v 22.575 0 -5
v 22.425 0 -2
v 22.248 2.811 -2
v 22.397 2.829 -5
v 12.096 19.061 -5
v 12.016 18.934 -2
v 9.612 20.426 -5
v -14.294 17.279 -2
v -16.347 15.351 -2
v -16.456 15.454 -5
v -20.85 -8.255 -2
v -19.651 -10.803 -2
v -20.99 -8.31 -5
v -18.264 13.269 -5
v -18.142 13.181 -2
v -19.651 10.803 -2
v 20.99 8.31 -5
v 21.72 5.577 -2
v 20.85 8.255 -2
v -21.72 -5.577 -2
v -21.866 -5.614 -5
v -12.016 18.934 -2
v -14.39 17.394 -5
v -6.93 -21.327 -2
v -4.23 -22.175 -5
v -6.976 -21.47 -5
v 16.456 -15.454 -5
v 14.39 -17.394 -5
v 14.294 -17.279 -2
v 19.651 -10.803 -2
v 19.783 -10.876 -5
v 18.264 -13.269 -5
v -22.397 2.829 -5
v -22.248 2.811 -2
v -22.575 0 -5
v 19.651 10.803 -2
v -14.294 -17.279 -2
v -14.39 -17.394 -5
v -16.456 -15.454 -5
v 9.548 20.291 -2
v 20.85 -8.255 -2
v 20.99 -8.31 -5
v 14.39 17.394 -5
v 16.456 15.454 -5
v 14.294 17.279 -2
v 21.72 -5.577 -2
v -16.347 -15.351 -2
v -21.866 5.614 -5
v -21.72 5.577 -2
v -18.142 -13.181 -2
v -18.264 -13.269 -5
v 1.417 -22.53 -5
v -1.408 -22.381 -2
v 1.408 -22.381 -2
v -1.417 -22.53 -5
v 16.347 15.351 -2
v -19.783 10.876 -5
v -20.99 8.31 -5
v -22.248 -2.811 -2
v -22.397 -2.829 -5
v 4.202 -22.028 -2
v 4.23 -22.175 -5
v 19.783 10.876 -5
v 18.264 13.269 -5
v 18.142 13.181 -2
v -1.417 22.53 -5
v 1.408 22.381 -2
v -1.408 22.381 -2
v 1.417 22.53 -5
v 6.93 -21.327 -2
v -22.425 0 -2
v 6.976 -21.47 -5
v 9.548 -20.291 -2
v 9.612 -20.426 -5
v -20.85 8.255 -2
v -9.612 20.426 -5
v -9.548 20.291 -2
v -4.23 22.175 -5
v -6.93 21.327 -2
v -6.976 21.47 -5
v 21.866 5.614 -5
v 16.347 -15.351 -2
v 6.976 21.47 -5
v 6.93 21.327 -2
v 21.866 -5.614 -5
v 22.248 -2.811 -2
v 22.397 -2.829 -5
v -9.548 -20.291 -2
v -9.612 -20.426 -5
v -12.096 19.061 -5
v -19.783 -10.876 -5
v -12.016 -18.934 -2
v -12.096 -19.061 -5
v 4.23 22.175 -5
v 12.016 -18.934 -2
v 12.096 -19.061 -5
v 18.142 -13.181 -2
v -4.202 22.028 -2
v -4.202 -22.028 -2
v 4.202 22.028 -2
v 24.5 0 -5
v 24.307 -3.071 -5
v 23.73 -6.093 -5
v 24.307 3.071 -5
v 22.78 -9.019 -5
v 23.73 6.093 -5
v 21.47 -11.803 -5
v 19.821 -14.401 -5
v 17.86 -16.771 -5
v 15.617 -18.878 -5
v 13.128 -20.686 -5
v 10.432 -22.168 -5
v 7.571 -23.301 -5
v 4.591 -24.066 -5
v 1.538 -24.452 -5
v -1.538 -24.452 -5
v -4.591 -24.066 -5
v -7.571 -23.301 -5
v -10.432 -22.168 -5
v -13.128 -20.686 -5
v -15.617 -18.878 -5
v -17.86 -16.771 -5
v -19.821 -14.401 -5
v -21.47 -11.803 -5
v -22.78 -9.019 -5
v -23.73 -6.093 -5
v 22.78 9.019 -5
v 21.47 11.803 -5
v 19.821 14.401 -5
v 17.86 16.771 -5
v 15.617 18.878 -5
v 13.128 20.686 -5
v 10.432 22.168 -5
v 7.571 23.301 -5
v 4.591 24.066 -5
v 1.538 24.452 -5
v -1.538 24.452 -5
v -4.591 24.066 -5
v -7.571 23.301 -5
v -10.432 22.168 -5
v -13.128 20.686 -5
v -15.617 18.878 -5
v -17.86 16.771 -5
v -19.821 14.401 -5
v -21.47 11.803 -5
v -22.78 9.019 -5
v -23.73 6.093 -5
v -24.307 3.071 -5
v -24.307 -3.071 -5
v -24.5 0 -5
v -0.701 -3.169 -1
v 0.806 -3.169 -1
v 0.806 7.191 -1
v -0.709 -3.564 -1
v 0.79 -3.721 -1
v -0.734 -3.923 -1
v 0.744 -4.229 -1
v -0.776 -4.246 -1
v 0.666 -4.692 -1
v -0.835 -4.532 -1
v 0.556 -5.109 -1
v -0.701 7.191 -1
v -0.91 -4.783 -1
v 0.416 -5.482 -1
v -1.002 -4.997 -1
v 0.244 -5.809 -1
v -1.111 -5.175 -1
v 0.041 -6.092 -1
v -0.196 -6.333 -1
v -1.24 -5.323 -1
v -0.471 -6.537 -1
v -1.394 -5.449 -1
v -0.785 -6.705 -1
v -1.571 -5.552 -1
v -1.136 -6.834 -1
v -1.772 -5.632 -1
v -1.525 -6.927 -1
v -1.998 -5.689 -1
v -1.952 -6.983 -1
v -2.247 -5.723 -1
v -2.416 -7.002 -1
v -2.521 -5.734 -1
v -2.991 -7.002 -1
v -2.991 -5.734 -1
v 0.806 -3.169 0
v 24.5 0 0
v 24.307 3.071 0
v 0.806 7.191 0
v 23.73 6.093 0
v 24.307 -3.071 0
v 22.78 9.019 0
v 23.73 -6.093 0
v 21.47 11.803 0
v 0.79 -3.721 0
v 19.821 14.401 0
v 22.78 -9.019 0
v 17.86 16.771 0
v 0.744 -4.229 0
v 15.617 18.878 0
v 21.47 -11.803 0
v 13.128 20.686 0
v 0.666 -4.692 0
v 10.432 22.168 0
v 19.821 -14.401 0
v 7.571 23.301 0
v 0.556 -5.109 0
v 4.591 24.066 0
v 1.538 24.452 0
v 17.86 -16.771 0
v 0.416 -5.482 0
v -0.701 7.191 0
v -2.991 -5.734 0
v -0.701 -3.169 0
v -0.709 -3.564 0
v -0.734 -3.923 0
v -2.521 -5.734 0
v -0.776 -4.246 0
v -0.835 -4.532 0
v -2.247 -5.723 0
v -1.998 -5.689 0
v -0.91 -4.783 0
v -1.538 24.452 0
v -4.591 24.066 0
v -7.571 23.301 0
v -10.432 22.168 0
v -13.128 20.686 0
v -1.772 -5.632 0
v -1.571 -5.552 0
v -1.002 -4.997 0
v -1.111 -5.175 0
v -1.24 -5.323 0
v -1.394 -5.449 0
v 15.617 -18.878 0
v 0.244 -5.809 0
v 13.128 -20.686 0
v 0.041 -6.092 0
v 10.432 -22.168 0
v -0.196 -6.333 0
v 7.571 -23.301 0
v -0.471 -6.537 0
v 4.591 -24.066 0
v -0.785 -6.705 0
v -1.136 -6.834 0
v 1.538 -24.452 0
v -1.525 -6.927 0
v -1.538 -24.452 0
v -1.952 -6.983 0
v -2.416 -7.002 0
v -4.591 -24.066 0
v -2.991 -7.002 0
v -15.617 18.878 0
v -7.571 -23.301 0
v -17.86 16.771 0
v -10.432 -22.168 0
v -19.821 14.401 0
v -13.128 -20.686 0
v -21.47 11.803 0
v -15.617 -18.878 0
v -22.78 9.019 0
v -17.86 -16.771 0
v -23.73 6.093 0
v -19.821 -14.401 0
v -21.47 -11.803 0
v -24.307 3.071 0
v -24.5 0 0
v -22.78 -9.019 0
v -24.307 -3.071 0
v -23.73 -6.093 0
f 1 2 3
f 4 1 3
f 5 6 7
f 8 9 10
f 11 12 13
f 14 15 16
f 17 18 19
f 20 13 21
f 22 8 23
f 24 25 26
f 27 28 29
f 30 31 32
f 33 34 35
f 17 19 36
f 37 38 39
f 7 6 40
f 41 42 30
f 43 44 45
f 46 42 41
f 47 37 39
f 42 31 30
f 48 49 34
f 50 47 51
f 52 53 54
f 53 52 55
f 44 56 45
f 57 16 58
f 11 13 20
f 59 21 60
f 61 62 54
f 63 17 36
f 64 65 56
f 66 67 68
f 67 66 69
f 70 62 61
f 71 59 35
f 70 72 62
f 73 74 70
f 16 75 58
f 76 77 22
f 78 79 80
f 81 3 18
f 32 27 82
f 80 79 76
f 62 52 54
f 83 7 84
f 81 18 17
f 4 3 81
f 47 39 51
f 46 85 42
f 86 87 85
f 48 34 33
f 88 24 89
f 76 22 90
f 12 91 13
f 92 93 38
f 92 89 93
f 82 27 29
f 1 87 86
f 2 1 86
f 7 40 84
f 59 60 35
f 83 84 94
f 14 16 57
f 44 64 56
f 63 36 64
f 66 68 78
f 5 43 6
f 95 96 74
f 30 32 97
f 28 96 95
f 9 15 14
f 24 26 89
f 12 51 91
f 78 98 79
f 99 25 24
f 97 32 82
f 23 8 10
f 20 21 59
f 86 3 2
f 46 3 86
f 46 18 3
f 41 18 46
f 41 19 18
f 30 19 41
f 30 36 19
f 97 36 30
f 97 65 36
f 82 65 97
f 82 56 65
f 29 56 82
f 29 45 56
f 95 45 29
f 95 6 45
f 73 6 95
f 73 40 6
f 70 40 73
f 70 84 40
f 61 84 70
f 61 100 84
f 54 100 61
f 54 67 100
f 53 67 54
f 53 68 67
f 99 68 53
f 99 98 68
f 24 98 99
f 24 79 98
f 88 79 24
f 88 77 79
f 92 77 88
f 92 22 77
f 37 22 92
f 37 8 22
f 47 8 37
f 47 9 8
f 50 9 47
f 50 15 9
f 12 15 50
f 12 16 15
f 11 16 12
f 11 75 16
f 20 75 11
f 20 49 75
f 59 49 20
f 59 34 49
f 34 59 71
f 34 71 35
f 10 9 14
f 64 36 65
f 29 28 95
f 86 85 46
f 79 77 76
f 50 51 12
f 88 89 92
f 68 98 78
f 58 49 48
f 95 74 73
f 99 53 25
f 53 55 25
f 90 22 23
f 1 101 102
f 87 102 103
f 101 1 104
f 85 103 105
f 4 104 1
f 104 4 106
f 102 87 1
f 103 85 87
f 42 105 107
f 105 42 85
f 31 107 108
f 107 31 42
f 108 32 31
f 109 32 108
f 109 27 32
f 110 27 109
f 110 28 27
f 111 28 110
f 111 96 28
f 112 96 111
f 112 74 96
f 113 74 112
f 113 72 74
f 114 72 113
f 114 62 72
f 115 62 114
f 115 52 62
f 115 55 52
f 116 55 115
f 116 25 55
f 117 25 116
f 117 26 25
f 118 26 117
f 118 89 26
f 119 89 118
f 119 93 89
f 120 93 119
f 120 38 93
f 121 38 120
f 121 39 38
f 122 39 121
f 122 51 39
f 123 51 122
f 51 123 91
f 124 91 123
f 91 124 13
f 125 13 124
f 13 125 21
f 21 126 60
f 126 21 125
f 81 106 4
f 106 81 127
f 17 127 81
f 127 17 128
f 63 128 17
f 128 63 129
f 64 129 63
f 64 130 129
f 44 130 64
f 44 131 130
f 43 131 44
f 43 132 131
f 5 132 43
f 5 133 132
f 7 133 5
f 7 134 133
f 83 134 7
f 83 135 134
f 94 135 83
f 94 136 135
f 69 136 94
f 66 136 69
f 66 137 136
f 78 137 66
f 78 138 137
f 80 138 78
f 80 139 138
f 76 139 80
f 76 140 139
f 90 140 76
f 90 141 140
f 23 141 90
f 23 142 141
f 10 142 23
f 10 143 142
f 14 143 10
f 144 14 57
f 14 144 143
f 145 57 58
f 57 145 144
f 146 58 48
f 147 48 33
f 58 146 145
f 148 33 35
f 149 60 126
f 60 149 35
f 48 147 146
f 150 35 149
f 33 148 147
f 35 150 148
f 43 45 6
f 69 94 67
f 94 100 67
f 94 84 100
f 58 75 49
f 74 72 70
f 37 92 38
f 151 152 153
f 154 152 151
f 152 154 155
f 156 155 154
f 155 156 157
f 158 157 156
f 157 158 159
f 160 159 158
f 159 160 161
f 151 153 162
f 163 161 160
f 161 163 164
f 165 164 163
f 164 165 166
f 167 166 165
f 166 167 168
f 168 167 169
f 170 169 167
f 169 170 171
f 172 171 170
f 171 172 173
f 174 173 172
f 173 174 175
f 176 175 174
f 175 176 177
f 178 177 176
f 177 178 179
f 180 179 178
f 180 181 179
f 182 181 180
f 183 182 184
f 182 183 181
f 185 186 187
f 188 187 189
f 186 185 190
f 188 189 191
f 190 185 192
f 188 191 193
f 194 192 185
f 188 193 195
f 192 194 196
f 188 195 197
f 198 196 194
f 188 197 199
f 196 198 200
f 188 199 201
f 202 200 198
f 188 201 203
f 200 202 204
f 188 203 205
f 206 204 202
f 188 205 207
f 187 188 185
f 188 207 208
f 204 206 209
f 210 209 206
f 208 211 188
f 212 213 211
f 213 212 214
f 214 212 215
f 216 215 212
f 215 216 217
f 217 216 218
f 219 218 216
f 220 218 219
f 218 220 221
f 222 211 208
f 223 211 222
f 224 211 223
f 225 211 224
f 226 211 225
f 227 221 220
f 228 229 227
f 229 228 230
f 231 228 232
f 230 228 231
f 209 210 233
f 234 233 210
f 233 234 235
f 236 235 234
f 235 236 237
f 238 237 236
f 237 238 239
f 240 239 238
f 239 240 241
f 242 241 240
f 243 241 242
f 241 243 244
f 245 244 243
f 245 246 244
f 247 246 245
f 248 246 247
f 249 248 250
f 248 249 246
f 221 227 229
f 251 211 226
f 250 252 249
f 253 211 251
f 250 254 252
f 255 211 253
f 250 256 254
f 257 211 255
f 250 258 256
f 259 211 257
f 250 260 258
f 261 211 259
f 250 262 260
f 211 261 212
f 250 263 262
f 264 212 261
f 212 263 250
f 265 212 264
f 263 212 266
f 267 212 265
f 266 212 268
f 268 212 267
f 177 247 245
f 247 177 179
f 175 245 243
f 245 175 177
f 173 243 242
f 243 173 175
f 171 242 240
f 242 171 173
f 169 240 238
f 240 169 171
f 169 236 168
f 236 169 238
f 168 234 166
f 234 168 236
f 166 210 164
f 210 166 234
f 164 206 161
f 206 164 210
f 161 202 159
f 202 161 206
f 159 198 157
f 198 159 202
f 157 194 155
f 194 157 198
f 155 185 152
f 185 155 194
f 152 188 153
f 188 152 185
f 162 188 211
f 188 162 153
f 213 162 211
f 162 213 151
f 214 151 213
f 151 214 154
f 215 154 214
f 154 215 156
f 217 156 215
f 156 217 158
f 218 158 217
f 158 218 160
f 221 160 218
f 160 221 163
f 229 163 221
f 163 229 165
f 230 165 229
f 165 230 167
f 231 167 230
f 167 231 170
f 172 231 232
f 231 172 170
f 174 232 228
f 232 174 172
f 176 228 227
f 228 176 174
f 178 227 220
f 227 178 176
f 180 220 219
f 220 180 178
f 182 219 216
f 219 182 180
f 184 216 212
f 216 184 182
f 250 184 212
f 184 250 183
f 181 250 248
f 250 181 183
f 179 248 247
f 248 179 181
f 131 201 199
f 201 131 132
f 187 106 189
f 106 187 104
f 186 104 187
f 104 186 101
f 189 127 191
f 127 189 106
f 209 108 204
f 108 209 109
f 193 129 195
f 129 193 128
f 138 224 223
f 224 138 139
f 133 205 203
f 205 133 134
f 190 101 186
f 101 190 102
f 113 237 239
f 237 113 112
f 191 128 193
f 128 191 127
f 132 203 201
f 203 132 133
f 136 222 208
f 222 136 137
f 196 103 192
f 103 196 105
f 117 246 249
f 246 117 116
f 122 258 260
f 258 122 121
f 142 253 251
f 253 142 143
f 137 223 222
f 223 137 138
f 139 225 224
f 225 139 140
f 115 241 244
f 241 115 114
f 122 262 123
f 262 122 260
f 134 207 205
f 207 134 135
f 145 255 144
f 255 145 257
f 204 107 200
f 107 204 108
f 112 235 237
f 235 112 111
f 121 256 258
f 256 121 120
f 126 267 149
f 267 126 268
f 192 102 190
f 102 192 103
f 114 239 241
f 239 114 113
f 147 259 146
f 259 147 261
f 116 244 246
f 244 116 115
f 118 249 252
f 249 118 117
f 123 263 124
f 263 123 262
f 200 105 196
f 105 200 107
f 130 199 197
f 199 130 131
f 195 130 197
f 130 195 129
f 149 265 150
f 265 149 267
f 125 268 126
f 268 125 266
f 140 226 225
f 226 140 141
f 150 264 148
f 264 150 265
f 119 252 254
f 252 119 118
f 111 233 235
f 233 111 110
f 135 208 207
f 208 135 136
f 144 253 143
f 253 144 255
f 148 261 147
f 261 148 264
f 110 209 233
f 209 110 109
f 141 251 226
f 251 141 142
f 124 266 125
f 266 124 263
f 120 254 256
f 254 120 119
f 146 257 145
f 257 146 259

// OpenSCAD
$fn = 50;

difference() {
	union() {
		translate(v = [0, 0, -5.0]) {
			cylinder(h = 5, r = 24.5);
		}
	}
	union() {
		#translate(v = [0, 0, -5.0]) {
			cylinder(h = 3, r1 = 22.575, r2 = 22.425);
		}
		translate(v = [0, 0, -1]) {
			linear_extrude(height = 1) {
				text(font = "Wingdings", halign = "center", size = 11, text = "J", valign = "center");
			}
		}
	}
}
